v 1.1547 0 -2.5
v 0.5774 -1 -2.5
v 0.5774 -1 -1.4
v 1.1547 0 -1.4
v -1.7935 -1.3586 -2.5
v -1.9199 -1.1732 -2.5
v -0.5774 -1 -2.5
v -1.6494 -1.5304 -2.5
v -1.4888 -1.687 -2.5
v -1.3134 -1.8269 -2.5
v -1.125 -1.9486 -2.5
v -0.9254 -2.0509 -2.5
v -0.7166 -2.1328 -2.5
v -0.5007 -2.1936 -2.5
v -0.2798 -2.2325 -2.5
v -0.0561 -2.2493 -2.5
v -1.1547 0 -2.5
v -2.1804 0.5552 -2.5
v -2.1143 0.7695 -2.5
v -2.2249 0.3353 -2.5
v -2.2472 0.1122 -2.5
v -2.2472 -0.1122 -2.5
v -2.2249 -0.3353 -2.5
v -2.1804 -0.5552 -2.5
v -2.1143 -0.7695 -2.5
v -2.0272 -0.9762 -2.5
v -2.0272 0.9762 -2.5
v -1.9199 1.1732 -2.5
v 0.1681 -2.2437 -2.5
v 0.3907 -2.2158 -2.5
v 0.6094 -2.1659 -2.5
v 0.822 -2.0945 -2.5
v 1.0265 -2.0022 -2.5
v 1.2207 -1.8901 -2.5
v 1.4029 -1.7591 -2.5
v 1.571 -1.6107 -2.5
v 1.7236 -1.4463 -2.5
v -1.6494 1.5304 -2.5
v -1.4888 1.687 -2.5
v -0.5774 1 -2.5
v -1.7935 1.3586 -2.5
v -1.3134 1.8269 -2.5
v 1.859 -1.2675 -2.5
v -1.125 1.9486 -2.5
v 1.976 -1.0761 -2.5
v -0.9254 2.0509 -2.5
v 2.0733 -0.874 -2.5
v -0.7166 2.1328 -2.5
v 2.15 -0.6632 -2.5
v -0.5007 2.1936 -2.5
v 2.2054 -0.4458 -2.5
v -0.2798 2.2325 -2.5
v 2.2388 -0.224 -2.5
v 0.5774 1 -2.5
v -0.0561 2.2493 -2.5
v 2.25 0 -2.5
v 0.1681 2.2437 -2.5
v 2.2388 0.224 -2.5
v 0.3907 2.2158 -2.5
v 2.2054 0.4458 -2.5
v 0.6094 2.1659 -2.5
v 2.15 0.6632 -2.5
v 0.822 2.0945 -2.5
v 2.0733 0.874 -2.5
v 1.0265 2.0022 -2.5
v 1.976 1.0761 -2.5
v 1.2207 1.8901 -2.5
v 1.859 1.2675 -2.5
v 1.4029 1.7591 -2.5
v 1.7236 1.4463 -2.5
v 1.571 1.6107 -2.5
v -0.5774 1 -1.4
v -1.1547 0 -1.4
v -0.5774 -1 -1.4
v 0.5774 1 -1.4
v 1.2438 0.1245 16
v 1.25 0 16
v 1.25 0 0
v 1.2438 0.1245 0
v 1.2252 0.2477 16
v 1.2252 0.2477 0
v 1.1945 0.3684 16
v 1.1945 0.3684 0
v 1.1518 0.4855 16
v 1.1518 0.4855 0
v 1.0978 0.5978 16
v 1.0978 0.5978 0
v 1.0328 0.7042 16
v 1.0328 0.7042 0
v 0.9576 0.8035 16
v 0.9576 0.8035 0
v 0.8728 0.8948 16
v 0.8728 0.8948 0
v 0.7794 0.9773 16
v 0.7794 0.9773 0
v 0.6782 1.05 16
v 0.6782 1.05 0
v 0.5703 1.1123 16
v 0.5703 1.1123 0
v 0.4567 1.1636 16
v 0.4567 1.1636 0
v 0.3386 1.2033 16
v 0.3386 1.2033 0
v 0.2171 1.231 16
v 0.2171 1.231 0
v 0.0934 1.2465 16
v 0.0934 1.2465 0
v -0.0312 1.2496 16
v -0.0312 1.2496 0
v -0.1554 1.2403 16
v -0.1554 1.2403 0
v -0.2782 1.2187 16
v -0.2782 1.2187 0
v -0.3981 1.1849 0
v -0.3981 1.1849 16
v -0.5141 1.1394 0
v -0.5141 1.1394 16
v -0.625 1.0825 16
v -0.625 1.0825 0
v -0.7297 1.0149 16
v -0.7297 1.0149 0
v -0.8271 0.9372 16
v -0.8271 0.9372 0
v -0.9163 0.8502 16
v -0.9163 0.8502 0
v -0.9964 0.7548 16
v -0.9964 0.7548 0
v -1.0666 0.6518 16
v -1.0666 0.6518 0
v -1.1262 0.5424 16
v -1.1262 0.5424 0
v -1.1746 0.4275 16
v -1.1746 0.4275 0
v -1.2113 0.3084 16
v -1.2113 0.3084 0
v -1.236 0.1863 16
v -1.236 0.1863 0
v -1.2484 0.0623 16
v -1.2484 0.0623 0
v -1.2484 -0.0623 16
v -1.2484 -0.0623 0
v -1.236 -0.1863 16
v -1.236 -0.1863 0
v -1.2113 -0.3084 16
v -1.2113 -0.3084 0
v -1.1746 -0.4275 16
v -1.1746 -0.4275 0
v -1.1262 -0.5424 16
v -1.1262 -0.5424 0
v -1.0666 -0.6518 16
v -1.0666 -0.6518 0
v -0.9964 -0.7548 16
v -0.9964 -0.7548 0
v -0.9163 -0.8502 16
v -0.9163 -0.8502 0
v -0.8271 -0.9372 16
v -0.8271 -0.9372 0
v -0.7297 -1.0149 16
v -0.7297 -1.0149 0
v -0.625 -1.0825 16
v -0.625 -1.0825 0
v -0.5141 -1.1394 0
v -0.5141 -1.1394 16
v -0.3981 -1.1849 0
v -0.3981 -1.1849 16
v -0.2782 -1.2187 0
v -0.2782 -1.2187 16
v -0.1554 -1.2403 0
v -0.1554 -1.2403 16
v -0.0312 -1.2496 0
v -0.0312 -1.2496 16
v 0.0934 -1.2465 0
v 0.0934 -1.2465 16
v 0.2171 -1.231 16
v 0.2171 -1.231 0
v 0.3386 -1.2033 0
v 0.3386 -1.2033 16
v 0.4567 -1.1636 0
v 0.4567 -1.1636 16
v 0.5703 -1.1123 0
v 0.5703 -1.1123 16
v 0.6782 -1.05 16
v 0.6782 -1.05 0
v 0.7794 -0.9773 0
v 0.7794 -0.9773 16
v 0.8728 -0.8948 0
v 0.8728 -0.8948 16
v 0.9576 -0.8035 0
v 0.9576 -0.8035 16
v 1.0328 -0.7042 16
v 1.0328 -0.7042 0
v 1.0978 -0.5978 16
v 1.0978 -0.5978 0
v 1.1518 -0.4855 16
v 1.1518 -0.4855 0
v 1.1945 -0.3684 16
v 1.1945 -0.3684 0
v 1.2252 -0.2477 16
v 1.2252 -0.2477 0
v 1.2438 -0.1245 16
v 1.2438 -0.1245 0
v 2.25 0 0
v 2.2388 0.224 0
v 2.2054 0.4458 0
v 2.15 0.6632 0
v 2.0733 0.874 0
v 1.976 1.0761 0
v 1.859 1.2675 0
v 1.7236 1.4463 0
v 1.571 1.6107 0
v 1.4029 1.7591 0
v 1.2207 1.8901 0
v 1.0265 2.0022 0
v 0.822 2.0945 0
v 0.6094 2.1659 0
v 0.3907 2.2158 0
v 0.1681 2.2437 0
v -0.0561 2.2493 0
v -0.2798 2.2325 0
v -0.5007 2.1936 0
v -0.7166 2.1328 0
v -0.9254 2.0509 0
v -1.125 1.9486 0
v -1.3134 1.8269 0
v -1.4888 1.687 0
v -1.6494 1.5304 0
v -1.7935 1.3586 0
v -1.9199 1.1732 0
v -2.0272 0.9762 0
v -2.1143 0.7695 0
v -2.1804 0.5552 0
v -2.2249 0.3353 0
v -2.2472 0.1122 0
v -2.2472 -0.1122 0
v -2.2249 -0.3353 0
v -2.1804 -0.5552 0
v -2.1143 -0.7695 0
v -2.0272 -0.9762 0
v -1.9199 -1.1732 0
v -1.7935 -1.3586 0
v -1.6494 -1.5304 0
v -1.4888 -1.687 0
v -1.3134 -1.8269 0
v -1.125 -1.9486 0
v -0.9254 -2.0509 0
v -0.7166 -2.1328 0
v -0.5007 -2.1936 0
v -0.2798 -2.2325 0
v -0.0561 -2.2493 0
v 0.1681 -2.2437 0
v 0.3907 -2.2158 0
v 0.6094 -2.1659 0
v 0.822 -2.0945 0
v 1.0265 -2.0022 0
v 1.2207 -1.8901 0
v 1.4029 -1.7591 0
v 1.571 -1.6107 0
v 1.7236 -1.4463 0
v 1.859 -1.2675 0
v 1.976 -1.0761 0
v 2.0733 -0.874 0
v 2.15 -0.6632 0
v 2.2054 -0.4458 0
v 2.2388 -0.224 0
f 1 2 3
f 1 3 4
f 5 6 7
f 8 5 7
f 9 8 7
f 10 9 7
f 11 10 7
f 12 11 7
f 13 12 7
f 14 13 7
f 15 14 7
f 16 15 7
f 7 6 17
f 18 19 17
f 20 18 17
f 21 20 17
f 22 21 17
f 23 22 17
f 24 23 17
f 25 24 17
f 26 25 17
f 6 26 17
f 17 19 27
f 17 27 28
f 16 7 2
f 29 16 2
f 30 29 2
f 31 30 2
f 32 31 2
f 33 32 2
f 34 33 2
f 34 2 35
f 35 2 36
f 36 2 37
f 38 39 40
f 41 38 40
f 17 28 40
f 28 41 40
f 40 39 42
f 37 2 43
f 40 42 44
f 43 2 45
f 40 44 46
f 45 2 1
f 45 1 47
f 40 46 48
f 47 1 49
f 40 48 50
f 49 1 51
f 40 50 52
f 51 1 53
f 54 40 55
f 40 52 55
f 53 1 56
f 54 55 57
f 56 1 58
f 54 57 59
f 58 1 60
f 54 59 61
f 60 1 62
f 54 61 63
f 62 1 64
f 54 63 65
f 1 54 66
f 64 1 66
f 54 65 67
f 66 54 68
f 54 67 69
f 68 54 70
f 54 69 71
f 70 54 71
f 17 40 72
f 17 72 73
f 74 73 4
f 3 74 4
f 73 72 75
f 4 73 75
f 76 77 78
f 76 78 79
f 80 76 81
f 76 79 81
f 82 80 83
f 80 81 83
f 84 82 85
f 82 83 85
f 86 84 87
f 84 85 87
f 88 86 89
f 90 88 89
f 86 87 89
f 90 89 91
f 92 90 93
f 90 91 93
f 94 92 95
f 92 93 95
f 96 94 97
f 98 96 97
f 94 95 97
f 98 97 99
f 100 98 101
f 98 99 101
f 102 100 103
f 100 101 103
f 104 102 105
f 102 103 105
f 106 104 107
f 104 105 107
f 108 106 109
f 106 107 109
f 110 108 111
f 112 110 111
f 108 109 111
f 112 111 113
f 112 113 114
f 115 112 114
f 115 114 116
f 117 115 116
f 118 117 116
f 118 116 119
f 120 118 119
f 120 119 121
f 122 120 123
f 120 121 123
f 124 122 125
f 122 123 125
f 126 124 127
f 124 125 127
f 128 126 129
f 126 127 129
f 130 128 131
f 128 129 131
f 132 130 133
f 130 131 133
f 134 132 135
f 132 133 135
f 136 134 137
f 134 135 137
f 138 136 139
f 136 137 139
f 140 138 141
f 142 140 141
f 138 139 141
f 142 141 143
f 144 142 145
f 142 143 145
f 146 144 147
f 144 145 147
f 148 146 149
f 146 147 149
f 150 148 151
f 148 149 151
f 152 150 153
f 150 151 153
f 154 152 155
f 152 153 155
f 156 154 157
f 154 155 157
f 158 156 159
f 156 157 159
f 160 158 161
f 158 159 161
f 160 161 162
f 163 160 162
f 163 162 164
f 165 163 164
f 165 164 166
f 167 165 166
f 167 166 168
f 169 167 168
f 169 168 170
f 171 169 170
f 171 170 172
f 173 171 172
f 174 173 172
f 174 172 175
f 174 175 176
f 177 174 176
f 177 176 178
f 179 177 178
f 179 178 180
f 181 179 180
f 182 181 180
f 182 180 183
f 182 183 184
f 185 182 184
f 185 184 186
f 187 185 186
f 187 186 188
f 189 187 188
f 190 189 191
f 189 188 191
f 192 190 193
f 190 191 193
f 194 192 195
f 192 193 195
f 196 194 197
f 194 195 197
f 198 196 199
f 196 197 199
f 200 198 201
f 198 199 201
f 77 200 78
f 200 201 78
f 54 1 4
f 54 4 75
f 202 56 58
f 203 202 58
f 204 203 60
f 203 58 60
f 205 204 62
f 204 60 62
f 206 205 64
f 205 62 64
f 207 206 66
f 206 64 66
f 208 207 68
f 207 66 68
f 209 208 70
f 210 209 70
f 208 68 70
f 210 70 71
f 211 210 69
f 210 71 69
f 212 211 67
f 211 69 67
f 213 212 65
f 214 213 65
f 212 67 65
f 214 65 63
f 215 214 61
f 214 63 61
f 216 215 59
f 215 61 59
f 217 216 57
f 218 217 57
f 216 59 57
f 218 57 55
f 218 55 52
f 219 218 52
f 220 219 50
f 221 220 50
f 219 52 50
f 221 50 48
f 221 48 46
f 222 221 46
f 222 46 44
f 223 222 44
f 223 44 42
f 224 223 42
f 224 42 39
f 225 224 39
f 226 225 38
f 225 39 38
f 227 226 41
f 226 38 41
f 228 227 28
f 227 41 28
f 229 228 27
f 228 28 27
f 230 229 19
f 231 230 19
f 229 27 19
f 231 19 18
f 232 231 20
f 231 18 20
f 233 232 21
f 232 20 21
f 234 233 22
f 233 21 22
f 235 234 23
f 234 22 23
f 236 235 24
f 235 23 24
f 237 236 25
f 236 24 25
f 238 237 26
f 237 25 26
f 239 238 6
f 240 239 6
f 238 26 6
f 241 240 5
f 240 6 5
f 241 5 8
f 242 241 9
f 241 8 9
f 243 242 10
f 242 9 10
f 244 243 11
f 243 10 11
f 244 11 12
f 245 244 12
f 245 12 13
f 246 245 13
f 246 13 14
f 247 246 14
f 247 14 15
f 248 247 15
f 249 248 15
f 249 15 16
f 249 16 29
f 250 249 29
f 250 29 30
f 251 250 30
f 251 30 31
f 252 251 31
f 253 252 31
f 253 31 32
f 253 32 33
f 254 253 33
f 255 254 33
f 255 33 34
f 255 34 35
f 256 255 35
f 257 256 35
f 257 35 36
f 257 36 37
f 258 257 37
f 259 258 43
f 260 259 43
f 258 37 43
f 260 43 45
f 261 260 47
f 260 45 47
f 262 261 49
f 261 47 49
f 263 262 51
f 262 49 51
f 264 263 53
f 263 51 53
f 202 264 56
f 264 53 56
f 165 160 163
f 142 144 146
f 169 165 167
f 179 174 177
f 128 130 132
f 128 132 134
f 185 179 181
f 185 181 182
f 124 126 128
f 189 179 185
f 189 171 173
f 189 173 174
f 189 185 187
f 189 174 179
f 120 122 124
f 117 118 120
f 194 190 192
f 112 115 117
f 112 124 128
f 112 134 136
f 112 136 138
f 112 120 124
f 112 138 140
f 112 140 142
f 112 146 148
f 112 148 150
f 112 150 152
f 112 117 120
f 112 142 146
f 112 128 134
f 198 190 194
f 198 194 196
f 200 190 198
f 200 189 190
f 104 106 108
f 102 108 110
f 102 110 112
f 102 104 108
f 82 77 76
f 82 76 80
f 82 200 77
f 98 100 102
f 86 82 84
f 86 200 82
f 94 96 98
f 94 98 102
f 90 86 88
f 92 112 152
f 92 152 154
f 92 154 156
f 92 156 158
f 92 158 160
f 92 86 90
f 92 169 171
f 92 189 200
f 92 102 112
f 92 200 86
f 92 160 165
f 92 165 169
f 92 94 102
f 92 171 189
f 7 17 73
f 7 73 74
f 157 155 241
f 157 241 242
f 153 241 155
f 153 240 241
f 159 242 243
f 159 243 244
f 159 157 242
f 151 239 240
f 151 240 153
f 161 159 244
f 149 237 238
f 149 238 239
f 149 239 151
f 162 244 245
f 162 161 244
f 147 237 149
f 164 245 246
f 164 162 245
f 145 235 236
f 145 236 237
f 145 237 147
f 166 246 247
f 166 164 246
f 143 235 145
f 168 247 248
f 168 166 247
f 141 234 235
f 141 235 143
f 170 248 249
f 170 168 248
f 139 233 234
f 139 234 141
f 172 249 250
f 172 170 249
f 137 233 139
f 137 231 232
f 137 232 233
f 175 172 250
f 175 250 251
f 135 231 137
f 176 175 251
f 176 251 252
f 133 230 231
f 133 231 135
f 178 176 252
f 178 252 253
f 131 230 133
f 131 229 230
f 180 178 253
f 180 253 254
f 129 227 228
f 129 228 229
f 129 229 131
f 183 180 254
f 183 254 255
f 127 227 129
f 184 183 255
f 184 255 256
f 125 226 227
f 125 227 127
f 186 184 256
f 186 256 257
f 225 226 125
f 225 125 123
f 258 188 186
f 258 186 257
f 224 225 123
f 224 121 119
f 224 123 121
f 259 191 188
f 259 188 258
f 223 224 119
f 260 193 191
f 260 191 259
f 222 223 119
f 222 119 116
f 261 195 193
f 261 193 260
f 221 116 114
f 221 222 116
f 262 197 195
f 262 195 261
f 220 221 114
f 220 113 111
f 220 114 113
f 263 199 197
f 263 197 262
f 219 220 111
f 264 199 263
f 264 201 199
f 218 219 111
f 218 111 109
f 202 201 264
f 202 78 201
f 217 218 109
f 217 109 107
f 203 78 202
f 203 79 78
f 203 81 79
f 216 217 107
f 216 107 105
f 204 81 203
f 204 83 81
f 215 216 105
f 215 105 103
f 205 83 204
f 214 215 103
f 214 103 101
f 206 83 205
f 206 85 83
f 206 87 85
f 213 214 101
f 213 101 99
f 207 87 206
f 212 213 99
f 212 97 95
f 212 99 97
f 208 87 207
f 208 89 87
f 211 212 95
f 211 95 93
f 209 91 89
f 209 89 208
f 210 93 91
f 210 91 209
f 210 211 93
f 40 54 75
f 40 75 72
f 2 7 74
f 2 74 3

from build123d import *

# Parameters (mm, degrees)
CABEZA_START            = -2.5
CROQUIS1_R              = 2.25
CABEZA_DEPTH            = 2.5
CROQUIS2_R              = 1.25
CUERPO_DEPTH            = 16
HEXAGONO_INTERIOR_START = -2.5
HEXAGONO_INTERIOR_DEPTH = 1.1


with BuildPart() as part:
    # Croquis1 → Cabeza (new body)
    with BuildSketch(Plane.XY.offset(CABEZA_START)):
        Circle(CROQUIS1_R)
    extrude(amount=CABEZA_DEPTH)

    # Croquis2 → Cuerpo (add)
    with BuildSketch(Plane.XY):
        Circle(CROQUIS2_R)
    extrude(amount=CUERPO_DEPTH)

    # Croquis3 → Hexagono_interior (cut)
    with BuildSketch(Plane.XY.offset(HEXAGONO_INTERIOR_START)):
        Polygon((1.154700538, 0), (0.577350269, 1), (-0.577350269, 1), (-1.154700538, 0), (-0.577350269, -1), (0.577350269, -1), align=None)
    extrude(amount=HEXAGONO_INTERIOR_DEPTH, mode=Mode.SUBTRACT)


solid = part.part
